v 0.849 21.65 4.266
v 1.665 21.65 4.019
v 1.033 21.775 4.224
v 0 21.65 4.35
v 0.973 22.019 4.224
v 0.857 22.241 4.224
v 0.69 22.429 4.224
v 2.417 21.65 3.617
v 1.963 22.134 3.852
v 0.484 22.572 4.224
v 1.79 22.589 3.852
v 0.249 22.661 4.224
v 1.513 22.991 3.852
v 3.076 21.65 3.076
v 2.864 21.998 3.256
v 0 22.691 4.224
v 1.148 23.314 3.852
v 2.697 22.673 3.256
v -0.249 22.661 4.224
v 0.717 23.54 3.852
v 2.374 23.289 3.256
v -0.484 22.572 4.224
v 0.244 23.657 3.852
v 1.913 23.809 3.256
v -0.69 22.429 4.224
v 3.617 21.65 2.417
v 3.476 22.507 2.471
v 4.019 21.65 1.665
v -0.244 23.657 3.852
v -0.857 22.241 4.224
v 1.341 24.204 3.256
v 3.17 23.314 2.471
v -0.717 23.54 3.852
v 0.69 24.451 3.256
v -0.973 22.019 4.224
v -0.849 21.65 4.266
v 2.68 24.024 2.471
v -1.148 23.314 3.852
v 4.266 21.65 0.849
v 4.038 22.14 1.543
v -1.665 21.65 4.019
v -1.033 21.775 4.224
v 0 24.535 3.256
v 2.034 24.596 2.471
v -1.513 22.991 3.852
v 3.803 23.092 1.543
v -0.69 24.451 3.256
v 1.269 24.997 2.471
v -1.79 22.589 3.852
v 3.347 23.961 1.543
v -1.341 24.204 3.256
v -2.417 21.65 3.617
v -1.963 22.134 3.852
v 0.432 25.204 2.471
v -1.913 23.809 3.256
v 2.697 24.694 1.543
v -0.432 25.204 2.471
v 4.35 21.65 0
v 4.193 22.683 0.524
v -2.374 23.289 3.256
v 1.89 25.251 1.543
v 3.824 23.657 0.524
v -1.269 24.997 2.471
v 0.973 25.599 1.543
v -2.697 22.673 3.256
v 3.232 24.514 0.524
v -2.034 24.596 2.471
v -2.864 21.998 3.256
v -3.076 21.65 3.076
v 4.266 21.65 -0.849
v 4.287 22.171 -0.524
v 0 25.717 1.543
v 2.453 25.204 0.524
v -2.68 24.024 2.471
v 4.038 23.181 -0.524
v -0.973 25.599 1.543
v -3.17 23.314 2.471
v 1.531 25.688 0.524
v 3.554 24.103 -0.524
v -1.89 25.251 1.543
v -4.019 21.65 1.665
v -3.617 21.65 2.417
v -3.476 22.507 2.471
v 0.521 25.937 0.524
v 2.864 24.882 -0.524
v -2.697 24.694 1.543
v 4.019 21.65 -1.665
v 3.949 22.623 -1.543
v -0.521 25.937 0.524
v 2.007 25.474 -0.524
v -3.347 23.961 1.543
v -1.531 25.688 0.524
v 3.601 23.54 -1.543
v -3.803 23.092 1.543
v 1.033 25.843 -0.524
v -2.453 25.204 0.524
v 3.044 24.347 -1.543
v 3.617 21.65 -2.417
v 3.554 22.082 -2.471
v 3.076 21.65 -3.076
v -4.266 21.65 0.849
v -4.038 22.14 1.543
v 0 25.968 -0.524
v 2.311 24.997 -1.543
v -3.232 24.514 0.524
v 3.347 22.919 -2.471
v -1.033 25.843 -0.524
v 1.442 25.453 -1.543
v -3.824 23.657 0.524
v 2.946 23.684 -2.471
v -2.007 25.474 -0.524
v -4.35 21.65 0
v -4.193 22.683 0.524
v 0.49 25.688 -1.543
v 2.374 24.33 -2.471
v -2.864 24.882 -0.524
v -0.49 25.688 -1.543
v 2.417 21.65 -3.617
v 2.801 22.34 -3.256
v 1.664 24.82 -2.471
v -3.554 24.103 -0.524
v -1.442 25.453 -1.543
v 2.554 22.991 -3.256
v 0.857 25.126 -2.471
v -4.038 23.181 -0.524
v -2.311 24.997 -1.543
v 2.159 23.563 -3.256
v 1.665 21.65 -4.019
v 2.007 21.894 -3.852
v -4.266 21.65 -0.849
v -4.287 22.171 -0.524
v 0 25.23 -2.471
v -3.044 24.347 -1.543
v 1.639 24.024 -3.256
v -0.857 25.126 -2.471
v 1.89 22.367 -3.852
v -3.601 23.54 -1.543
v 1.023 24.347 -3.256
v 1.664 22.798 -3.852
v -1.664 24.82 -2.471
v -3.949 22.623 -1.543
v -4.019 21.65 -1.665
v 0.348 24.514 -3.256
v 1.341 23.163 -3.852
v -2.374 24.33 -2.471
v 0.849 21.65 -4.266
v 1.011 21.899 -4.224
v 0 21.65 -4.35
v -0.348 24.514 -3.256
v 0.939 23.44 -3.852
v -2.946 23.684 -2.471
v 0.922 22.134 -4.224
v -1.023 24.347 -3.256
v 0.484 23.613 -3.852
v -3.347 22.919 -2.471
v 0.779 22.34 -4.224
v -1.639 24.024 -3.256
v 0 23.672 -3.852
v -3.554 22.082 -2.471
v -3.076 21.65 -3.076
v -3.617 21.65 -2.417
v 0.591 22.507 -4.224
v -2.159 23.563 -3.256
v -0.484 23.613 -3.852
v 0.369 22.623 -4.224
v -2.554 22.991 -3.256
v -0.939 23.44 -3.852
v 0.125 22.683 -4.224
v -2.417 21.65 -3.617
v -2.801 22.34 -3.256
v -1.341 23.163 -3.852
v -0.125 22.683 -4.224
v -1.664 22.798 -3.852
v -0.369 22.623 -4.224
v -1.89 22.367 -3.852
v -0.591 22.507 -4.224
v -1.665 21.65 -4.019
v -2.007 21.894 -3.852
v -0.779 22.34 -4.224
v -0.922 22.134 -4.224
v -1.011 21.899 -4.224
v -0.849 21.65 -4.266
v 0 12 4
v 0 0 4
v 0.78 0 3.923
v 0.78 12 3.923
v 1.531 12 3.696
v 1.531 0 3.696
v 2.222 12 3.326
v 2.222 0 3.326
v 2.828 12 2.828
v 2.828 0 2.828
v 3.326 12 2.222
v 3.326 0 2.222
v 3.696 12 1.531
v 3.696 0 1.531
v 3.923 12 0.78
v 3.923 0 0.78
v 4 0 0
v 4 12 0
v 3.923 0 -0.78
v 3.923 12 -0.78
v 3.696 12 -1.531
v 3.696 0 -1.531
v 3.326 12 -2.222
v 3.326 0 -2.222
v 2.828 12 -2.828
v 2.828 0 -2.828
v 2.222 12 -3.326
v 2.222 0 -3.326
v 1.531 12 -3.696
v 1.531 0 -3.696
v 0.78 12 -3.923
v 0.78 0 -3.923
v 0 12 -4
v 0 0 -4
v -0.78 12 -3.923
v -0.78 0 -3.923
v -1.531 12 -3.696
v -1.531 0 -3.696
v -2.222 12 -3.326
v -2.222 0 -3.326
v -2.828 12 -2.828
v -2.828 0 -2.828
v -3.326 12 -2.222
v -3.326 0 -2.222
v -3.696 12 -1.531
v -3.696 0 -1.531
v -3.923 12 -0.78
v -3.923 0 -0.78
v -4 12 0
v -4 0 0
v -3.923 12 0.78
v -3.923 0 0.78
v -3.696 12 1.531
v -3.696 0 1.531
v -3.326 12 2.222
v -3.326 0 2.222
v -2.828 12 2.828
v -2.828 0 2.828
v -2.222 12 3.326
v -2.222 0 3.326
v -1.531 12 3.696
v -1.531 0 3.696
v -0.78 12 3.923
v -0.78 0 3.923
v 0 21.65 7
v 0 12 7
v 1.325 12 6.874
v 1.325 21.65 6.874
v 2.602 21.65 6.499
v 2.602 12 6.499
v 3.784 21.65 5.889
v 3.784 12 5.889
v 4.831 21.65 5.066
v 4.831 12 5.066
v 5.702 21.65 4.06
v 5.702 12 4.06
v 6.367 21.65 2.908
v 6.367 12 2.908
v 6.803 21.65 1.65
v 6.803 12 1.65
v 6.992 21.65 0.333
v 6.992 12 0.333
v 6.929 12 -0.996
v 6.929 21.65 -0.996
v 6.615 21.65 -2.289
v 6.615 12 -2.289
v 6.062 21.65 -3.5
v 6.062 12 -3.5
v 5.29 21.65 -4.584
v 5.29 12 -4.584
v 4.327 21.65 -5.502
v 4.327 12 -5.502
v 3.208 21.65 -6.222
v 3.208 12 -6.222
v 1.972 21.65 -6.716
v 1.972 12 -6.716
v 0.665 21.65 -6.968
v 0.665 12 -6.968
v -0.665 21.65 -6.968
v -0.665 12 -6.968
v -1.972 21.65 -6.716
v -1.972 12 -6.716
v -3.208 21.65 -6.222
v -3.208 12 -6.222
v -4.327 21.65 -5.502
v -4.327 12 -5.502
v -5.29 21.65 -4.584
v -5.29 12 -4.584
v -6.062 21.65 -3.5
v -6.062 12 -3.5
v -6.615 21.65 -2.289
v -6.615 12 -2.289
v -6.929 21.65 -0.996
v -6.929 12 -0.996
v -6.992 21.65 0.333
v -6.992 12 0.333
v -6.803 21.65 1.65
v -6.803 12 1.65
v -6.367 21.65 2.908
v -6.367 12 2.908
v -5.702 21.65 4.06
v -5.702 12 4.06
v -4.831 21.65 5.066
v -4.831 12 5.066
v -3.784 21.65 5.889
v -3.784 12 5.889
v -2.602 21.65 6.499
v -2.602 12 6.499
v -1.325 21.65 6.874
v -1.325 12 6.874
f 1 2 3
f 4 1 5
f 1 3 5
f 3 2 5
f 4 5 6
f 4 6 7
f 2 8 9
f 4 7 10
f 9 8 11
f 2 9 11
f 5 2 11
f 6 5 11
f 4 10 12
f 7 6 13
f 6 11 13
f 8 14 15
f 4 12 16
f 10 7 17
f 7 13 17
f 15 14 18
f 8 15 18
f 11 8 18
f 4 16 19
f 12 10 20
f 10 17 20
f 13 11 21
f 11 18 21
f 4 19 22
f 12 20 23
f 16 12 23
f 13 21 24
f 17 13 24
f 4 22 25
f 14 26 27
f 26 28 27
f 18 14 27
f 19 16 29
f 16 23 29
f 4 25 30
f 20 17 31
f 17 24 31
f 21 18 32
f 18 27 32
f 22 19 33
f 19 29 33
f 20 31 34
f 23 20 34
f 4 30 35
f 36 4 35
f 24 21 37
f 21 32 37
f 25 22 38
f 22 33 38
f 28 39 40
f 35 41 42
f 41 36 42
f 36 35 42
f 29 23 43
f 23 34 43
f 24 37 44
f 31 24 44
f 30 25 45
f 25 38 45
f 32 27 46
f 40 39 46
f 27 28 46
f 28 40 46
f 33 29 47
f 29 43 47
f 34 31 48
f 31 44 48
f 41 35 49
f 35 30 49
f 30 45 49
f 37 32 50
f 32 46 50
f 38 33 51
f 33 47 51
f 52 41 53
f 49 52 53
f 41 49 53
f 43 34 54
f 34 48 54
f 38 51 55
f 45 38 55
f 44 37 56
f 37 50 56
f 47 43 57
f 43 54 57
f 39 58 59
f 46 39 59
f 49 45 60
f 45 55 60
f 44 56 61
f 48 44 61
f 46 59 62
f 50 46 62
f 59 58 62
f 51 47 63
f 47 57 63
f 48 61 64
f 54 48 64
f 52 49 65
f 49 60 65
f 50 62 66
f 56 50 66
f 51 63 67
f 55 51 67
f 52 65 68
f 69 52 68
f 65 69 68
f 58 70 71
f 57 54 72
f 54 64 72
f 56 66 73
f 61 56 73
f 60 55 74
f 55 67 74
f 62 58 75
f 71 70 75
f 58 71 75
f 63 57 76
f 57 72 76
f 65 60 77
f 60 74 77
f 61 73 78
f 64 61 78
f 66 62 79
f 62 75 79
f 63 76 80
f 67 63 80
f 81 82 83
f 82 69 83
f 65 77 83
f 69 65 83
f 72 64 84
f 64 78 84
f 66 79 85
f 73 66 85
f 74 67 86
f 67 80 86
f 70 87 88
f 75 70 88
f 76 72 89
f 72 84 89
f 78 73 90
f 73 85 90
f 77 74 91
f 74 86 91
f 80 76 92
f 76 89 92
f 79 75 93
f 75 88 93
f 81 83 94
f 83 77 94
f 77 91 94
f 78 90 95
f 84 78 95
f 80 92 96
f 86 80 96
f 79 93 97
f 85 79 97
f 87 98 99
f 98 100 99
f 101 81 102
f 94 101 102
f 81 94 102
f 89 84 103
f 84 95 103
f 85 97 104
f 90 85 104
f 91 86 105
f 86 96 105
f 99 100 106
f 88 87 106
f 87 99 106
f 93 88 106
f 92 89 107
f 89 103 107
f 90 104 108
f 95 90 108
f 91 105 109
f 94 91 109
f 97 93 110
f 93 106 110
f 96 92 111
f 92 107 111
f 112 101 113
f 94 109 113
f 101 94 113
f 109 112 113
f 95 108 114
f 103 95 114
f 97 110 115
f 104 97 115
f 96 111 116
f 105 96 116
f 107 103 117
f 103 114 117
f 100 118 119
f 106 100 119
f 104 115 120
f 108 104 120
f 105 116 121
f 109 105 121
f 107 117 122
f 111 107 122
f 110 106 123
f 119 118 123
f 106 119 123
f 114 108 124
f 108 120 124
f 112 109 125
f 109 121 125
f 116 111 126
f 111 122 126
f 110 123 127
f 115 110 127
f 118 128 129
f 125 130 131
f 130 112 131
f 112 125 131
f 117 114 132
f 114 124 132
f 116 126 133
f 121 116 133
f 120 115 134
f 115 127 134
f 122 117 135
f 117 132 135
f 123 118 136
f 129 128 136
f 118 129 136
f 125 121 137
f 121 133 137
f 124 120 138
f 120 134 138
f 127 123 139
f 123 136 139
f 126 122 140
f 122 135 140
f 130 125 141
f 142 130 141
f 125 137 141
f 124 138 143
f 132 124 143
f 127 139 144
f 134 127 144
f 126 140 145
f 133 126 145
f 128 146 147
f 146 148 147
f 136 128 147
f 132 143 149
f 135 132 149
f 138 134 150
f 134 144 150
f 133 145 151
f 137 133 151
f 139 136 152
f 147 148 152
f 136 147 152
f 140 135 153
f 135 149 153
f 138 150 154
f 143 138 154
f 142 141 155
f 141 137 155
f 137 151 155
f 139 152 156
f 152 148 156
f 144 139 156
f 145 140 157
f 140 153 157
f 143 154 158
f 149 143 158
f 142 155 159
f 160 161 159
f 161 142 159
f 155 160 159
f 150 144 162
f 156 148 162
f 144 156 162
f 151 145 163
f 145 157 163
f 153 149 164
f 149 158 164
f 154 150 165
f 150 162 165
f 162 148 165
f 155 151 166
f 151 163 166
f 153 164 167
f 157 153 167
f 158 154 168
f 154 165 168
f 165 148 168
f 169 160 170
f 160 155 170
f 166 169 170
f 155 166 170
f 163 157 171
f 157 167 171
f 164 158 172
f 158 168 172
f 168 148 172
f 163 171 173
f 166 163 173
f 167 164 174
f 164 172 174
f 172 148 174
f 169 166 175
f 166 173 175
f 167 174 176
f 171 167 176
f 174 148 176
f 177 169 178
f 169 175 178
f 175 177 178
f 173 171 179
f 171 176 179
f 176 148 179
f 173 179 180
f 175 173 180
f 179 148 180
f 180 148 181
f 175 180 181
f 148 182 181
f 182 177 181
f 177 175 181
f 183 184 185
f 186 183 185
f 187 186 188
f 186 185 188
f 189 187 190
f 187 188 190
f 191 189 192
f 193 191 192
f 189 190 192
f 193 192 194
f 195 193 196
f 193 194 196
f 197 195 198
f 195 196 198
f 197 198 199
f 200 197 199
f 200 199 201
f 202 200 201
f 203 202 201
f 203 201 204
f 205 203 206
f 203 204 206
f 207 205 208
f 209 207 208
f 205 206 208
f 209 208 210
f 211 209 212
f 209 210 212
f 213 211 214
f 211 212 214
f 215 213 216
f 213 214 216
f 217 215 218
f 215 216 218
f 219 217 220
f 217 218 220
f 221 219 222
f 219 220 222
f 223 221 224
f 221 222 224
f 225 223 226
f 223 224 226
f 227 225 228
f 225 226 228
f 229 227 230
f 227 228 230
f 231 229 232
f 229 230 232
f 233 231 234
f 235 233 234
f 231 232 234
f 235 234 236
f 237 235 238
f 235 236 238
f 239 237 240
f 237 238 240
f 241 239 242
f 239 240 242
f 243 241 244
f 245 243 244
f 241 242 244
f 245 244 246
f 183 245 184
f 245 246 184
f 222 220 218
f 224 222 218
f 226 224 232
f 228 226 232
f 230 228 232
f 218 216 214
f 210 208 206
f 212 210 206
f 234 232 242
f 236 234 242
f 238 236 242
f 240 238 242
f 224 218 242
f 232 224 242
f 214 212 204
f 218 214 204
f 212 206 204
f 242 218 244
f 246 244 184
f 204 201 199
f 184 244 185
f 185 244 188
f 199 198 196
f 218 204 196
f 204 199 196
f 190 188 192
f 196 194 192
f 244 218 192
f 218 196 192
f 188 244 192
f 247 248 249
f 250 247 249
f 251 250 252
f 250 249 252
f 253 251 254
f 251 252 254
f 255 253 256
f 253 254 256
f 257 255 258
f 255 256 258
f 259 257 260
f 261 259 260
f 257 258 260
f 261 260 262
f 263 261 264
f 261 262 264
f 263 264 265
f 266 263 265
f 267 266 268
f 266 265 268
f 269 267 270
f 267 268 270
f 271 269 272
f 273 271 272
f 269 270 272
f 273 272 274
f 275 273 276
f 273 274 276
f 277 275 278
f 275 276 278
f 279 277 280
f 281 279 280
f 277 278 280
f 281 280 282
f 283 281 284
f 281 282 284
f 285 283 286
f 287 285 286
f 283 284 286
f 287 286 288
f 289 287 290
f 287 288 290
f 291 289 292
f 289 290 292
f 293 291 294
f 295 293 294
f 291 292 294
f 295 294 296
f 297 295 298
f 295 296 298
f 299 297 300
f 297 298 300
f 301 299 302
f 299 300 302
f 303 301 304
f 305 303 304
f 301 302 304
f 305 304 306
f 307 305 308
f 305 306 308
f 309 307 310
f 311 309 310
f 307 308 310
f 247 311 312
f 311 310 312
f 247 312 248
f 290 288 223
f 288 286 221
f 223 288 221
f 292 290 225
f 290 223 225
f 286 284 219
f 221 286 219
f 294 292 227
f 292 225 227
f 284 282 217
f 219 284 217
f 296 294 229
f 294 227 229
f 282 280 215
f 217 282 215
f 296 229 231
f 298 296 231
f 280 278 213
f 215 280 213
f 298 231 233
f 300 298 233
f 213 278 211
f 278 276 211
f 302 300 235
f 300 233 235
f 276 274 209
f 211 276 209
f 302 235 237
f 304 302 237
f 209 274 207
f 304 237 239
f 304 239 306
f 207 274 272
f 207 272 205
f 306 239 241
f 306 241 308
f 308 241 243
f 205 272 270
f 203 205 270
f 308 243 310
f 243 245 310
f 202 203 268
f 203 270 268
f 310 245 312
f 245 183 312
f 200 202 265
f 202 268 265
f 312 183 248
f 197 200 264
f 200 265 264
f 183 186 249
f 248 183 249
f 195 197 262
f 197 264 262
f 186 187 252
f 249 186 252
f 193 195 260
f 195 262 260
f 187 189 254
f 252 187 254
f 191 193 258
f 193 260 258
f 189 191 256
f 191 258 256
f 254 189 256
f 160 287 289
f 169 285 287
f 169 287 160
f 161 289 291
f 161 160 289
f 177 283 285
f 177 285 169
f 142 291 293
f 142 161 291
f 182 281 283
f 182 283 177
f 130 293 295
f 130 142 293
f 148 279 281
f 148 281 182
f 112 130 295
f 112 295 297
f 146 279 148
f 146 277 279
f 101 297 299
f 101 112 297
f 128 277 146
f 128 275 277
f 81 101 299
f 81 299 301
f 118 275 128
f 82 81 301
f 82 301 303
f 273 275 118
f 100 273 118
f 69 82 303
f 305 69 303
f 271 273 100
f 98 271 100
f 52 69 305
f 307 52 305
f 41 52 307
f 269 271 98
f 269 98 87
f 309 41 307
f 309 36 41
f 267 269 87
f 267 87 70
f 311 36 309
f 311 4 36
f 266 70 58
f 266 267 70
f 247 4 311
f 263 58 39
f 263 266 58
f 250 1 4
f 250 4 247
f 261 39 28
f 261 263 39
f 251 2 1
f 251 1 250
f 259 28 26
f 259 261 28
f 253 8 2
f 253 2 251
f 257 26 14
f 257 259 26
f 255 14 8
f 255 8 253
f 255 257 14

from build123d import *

# Parameters (mm, degrees)
SKETCH_1_R      = 4
EXTRUDE_1_DEPTH = 12
SKETCH_2_R      = 7
EXTRUDE_2_DEPTH = 9.65


with BuildPart() as part:
    # 草图1 → 凸台-拉伸1 (new body)
    with BuildSketch(Plane(origin=(0, 0, 0), x_dir=(1, 0, 0), z_dir=(0, 1, 0))):
        with Locations(Location((0, 0, 0), (0, 0, 270))):
            Circle(SKETCH_1_R)
    extrude(amount=EXTRUDE_1_DEPTH)

    # 草图2 → 凸台-拉伸2 (add)
    with BuildSketch(Plane(origin=(0, 12, 0), x_dir=(1, 0, 0), z_dir=(0, 1, 0))):
        with Locations(Location((0, 0, 0), (0, 0, 270))):
            Circle(SKETCH_2_R)
    extrude(amount=EXTRUDE_2_DEPTH)

    # 草图3 → 旋转1 (revolve)
    with BuildSketch(Plane(origin=(0, 21.65, 0), x_dir=(1, 0, 0), z_dir=(0, 1, 0))):
        with BuildLine():
            Line((0, 4.35), (0, -4.35))
            ThreePointArc((0, -4.35), (4.35, 0), (0, 4.35))
        make_face()
    revolve(axis=Axis((0, 21.65, -4.35), (0, 0, 1)))


solid = part.part
